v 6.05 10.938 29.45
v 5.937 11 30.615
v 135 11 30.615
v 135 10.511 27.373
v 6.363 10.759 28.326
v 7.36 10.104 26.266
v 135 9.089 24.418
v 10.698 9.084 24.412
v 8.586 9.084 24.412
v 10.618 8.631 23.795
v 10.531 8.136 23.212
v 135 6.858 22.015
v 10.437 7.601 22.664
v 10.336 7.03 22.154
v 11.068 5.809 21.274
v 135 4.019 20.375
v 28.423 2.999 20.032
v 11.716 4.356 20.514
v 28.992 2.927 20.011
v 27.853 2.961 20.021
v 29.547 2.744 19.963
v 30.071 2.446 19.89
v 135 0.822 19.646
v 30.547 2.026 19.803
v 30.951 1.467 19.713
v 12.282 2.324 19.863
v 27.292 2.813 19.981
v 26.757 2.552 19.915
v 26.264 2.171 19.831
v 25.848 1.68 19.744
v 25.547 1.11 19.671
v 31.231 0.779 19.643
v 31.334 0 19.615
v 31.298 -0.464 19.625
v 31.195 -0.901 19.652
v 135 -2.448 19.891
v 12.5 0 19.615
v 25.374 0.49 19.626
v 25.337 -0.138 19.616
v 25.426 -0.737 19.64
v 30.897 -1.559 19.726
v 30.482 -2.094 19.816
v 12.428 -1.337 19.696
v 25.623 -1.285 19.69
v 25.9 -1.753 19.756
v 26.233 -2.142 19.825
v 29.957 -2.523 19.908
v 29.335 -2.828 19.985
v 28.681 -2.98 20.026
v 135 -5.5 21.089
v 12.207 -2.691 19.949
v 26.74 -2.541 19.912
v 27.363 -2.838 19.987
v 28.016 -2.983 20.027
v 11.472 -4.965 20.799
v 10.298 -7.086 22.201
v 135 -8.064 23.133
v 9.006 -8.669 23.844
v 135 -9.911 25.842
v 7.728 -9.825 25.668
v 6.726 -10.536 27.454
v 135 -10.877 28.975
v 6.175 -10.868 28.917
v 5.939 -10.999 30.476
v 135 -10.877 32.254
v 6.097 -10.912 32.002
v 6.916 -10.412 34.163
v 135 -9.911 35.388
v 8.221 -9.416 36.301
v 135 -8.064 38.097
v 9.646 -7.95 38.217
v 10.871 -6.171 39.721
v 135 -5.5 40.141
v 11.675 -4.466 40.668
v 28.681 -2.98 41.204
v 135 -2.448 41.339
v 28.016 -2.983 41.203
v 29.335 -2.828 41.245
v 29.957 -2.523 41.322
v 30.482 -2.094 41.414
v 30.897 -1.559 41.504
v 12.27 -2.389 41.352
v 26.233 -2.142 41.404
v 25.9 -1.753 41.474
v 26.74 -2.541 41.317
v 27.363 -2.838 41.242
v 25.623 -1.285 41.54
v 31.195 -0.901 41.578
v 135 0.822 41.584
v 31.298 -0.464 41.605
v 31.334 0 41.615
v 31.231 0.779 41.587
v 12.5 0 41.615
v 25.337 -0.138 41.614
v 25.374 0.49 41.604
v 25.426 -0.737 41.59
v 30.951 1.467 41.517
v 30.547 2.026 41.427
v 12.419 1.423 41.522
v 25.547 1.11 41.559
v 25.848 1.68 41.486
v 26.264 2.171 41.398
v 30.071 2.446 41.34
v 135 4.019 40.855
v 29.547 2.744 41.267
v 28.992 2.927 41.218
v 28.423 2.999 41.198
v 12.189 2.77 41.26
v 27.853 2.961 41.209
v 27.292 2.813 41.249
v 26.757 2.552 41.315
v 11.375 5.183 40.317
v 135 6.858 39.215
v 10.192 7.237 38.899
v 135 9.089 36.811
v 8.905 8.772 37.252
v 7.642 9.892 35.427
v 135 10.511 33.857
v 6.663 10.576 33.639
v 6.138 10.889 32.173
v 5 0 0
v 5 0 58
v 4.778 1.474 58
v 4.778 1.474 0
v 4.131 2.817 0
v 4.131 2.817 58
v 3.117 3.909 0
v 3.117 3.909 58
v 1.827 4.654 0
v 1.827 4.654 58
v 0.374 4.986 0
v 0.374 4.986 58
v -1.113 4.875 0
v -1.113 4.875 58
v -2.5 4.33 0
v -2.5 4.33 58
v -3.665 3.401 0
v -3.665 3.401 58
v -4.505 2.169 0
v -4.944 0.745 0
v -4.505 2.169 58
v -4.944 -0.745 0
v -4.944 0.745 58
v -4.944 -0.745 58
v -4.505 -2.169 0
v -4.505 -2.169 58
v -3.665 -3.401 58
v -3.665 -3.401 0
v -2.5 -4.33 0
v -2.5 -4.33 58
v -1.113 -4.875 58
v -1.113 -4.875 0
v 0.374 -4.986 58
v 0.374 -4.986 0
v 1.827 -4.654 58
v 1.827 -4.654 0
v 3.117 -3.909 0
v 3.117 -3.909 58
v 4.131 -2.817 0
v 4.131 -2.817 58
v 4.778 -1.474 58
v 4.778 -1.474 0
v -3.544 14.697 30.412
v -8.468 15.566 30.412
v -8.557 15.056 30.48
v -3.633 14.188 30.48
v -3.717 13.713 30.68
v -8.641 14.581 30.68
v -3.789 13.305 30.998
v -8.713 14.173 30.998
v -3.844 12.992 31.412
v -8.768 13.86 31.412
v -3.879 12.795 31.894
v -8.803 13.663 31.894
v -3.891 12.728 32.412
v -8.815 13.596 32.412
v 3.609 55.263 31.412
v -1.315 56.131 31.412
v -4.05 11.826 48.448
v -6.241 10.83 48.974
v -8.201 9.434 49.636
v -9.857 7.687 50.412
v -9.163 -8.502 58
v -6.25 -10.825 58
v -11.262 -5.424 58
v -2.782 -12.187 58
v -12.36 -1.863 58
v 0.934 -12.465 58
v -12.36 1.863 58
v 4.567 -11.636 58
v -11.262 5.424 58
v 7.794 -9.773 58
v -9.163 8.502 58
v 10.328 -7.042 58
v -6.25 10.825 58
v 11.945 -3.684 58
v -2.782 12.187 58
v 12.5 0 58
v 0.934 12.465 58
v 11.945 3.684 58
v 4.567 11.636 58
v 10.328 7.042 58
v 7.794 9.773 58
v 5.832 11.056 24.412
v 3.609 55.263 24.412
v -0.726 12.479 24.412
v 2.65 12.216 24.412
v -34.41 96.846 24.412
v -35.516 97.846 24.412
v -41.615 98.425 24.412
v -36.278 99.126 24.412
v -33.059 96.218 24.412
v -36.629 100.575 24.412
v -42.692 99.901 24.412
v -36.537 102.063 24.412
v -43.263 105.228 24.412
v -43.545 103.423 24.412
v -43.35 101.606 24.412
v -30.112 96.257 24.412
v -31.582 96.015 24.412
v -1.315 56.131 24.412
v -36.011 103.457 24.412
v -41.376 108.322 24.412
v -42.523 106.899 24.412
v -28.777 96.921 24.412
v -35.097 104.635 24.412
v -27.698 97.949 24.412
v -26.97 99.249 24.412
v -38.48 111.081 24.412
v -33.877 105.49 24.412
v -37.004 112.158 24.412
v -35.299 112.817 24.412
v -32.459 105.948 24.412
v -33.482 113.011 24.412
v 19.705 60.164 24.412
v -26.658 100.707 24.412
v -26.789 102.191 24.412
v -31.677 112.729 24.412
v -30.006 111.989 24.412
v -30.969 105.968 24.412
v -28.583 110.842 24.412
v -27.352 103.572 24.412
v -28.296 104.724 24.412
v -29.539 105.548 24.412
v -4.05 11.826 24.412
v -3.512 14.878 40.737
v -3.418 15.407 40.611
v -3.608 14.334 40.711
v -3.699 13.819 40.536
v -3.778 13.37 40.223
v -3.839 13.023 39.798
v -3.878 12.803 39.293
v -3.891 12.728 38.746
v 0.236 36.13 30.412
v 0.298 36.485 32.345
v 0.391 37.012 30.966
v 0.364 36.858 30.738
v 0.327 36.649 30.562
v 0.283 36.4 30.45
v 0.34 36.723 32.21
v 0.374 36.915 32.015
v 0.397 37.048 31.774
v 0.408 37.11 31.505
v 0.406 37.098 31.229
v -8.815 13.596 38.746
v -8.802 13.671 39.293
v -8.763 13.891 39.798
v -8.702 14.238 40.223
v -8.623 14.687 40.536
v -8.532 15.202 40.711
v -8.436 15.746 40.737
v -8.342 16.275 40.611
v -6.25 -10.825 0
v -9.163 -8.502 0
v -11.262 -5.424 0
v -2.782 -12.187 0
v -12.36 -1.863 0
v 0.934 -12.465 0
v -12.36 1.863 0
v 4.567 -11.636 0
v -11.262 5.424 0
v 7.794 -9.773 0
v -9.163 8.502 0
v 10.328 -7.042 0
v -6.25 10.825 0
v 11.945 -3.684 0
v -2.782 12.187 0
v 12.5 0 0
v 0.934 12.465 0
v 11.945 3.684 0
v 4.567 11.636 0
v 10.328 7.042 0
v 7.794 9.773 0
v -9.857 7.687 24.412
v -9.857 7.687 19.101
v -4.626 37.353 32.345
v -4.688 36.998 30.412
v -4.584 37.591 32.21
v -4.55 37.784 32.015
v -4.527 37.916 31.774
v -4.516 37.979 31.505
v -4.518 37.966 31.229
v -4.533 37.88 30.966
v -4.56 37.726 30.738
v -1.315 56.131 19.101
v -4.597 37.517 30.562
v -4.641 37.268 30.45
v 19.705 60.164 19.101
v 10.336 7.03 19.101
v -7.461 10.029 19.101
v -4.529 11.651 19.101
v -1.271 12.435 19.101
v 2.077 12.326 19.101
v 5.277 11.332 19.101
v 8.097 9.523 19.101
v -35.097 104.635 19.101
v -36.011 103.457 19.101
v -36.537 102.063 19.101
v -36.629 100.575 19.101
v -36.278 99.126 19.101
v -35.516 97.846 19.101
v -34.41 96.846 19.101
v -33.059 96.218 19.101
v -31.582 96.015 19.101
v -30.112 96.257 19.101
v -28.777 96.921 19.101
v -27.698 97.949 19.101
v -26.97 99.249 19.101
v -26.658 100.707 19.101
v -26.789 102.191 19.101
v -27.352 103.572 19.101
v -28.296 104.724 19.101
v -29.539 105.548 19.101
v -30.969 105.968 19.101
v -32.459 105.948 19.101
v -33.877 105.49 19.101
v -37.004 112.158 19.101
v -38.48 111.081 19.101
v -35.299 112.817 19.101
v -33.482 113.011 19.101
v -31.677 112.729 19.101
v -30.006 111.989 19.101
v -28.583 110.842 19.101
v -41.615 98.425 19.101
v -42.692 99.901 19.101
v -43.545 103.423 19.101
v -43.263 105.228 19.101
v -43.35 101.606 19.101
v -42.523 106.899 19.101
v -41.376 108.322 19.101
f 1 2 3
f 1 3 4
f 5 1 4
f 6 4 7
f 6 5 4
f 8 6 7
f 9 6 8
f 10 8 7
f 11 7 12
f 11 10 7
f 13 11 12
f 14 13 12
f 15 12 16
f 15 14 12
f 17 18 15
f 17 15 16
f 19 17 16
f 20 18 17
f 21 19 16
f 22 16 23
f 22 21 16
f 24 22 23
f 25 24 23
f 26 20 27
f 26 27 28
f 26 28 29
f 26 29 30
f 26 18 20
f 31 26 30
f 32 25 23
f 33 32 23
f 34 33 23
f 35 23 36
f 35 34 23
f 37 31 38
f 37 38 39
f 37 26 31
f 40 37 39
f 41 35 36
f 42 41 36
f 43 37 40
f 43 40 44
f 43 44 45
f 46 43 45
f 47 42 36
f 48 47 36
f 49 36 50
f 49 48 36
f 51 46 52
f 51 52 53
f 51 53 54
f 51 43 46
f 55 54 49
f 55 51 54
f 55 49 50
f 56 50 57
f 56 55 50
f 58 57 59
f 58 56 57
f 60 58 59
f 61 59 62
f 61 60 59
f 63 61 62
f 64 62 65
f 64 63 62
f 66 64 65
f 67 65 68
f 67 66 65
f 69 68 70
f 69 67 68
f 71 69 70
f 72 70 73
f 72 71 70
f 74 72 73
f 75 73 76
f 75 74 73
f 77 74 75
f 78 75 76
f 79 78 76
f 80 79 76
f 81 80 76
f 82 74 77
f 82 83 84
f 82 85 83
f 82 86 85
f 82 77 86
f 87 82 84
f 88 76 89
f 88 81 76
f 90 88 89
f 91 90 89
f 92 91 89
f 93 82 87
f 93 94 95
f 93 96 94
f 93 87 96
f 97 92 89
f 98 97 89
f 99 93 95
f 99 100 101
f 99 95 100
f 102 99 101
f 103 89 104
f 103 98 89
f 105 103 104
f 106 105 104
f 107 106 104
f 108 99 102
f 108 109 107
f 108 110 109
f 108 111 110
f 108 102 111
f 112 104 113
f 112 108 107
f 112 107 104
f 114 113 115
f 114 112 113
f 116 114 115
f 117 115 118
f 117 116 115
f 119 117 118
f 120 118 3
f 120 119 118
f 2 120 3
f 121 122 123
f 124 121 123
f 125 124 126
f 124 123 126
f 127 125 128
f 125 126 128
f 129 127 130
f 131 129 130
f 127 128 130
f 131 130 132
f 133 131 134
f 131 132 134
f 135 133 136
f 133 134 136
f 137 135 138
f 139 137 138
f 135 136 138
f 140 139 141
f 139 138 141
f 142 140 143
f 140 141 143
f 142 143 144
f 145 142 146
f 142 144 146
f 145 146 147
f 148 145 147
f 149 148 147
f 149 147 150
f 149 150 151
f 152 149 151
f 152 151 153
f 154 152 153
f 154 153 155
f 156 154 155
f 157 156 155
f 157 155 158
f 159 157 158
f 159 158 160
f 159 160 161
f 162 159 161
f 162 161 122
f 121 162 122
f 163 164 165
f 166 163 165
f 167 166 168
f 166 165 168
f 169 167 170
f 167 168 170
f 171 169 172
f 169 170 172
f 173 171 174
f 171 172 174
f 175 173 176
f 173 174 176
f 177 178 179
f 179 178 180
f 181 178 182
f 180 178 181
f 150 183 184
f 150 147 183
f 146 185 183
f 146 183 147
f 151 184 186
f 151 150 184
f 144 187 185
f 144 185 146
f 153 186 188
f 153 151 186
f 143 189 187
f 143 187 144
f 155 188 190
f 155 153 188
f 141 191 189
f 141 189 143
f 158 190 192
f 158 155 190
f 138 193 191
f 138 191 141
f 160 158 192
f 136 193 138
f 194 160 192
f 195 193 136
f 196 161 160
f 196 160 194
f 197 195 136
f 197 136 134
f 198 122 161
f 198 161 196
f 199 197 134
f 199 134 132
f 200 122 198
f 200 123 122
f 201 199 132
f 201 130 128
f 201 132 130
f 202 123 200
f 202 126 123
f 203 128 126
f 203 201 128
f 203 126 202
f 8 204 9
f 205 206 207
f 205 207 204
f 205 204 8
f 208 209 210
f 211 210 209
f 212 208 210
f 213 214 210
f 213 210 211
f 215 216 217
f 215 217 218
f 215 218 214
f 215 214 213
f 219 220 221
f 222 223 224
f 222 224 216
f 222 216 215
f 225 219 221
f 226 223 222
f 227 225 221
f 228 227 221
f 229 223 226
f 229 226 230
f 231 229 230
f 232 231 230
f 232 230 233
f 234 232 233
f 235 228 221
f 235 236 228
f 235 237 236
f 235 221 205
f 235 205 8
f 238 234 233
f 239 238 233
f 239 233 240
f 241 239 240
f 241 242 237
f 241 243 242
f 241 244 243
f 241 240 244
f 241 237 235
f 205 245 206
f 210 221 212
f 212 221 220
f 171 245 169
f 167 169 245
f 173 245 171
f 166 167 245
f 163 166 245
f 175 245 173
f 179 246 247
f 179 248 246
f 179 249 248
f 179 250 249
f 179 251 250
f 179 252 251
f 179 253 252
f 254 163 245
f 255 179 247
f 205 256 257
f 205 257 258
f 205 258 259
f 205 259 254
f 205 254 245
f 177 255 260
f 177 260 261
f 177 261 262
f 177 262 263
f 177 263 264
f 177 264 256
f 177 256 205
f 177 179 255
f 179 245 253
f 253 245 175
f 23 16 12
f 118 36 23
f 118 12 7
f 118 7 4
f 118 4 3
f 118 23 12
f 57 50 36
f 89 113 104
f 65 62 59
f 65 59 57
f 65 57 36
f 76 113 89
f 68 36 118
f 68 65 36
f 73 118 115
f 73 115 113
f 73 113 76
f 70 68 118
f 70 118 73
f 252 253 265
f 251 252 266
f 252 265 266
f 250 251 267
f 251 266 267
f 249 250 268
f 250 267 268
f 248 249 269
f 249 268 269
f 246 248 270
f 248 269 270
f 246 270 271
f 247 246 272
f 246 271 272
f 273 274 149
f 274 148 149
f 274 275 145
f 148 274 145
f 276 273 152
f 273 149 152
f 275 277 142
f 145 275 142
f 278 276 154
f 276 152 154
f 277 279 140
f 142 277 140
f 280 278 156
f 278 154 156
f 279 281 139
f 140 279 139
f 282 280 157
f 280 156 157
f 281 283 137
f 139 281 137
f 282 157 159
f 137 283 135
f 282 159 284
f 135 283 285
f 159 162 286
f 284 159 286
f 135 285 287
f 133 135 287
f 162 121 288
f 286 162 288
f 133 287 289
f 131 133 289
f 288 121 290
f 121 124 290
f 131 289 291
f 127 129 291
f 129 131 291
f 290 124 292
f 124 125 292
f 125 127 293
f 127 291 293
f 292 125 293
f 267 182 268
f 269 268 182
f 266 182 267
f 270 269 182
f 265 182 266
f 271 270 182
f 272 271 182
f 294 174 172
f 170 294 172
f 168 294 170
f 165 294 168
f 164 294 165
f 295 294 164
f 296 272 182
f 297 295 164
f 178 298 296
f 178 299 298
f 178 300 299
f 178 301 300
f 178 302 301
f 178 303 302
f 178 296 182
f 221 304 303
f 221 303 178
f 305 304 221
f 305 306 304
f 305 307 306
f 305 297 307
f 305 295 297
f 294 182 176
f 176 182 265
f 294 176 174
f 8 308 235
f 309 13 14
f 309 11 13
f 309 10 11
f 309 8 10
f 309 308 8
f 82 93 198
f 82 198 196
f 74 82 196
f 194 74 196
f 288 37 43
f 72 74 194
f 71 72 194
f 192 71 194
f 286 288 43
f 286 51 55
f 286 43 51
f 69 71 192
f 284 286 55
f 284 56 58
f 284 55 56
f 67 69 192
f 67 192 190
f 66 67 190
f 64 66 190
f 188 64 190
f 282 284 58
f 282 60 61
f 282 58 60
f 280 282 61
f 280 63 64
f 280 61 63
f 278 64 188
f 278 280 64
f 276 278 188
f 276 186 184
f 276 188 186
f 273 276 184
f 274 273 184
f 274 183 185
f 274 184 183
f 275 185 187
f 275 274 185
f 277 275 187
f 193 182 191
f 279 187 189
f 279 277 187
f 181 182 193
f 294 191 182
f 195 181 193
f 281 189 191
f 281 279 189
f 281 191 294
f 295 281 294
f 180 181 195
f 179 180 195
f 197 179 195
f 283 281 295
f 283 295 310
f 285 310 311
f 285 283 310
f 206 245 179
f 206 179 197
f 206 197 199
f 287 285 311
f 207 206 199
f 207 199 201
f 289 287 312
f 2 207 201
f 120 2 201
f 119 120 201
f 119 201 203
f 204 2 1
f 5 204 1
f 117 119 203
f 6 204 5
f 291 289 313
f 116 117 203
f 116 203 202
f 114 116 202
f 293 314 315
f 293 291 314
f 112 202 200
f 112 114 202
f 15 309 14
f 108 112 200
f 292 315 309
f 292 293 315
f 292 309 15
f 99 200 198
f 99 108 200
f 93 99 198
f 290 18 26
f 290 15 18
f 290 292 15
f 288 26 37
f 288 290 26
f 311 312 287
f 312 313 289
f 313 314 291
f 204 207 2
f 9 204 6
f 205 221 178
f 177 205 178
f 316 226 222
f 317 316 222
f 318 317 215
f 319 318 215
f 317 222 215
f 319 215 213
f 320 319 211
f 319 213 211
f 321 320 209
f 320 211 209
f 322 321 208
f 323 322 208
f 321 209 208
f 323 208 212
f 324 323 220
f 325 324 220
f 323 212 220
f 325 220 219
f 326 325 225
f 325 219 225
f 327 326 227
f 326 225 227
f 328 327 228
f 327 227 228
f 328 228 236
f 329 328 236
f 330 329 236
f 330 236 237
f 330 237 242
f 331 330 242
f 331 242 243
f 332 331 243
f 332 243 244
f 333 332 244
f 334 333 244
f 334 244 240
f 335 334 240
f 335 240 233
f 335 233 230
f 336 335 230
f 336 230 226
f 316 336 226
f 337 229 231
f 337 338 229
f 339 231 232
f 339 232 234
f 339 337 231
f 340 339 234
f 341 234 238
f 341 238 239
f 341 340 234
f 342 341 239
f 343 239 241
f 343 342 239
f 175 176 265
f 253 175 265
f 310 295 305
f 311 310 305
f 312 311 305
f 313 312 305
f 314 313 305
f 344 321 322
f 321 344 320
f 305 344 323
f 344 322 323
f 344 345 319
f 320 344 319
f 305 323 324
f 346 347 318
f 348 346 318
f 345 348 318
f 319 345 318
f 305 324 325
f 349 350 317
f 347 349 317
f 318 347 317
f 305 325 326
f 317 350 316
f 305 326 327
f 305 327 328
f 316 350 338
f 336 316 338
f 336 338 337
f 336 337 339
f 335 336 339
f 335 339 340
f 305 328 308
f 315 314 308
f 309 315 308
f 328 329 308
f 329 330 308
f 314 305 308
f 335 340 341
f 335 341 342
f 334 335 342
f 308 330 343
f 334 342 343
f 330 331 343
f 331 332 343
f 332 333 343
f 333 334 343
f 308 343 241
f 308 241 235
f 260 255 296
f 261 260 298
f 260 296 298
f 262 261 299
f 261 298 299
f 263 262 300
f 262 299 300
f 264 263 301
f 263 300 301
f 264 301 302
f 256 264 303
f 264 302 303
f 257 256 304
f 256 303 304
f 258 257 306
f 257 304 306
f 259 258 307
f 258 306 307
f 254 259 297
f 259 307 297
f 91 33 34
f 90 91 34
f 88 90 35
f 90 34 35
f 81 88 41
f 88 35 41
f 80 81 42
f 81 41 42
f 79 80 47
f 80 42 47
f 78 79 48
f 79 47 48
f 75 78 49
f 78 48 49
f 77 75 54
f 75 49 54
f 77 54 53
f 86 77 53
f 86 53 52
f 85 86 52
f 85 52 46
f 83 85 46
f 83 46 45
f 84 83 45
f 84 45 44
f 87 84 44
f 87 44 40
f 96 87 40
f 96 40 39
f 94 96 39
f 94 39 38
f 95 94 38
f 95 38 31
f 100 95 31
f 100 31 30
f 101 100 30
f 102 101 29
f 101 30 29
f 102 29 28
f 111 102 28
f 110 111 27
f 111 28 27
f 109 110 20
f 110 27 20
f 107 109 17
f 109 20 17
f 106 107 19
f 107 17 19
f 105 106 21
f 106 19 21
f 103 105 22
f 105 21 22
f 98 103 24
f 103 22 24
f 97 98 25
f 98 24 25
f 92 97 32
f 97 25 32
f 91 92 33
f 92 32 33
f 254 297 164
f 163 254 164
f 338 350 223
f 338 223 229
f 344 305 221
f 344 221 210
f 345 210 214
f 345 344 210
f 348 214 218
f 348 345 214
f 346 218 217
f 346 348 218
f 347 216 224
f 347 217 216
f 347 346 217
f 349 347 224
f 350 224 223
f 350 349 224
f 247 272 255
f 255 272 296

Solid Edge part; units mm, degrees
sketch "Sketch1" plane through (0, 0, 0) normal (0, 0, 1) x (1, 0, 0)
  circle A0 centre (0, 0) radius 12.5
extrude "Protrusion1" add sketch "Sketch1" along normal blind 58
sketch "Sketch2" plane through (0, 0, 0) normal (1, 0, 0) x (0, 1, 0)
  circle A0 centre (0, 30.6149) radius 11
extrude "ExtrudedProtrusion_2" add sketch "Sketch2" along normal blind 135
sketch "Sketch3" plane through (0, 0, 58) normal (0, 0, 1) x (1, 0, 0)
  circle A0 centre (0, 0) radius 5
extrude "ExtrudedCutout_1" cut sketch "Sketch3" against normal blind 74.8467
cosmetic_thread "Thread_1" size "Tr 22 x 8" thread depth 22
sketch "Sketch4" plane through (0, 0, 0) normal (0, 0, 1) x (1, 0, 0)
  circle A0 centre (28.334, 0) radius 3
extrude "ExtrudedCutout_2" cut sketch "Sketch4" along normal blind 57.1507
sketch "Sketch5" plane through (0, 0, 19.1008) normal (0, 0, 1) x (1, 0, 0)
  arc A0 (-10.1543, 6) -> (10.1543, 6) centre (0, 0) cw
  line L0 (19.7049, 60.1644) -> (10.1543, 6)
  line L1 (-28.5835, 110.8421) -> (19.7049, 60.1644)
  arc A1 (-38.4801, 111.0811) -> (-28.5835, 110.8421) centre (-33.6513, 106.0133) cw
  line L2 (-41.376, 108.3217) -> (-38.4801, 111.0811)
  arc A2 (-41.376, 108.3217) -> (-41.6149, 98.4251) centre (-36.5471, 103.2539) ccw
  line L3 (-1.3148, 56.131) -> (-41.6149, 98.4251)
  line L4 (-10.1543, 6) -> (-1.3148, 56.131)
  dimension "D1" = 70
  dimension "D2" = 20
  dimension "D3" = 55
  dimension "D4" = 7
  dimension "D5" = 7
  dimension "D6" = 18
  dimension "D7" = 6
  dimension "D8" = 6
extrude "ExtrudedProtrusion_3" add sketch "Sketch5" along normal blind 5.3111
sketch "Sketch6" plane through (-15.6273, 67.3558, 24.4118) normal (0, 0, 1) x (-0.6898, 0.724, 0)
  circle A0 centre (35.4203, -11.6185) radius 5
  dimension "D1" = 12
extrude "ExtrudedCutout_5" cut sketch "Sketch6" against normal blind 21.5165 and the other way blind 19.734
sketch "Sketch7" plane through (-5.5858, 31.9091, 21.7563) normal (-0.9848, 0.1736, 0) x (-0.1736, -0.9848, 0)
  line L0 (24.5955, 2.6555) -> (-24.5955, 2.6555)
  line L1 (-24.5955, 2.6555) -> (-24.5955, 9.6555)
  line L2 (-24.5955, 9.6555) -> (24.5955, 28.6555)
  line L3 (24.5955, 28.6555) -> (24.5955, 2.6555)
  line L4 (-5.1676, 8.6555) -> (16.5955, 8.6555)
  arc A0 (16.5955, 8.6555) -> (18.5955, 10.6555) centre (16.5955, 10.6555) ccw
  line L5 (18.5955, 10.6555) -> (18.5955, 16.9895)
  arc A1 (15.8749, 18.8552) -> (18.5955, 16.9895) centre (16.5955, 16.9895) cw
  line L6 (15.8749, 18.8552) -> (-5.5279, 10.5884)
  arc A2 (-5.5279, 10.5884) -> (-5.1676, 8.6555) centre (-5.1676, 9.6555) ccw
  dimension "D1" = 26
  dimension "D2" = 7
  dimension "D3" = 6
  dimension "D4" = 6
  dimension "D5" = 6
  dimension "D6" = 2
  dimension "D7" = 2
  dimension "D8" = 1
extrude "ExtrudedProtrusion_5" add sketch "Sketch7" against normal blind 5
properties material "Steel"
